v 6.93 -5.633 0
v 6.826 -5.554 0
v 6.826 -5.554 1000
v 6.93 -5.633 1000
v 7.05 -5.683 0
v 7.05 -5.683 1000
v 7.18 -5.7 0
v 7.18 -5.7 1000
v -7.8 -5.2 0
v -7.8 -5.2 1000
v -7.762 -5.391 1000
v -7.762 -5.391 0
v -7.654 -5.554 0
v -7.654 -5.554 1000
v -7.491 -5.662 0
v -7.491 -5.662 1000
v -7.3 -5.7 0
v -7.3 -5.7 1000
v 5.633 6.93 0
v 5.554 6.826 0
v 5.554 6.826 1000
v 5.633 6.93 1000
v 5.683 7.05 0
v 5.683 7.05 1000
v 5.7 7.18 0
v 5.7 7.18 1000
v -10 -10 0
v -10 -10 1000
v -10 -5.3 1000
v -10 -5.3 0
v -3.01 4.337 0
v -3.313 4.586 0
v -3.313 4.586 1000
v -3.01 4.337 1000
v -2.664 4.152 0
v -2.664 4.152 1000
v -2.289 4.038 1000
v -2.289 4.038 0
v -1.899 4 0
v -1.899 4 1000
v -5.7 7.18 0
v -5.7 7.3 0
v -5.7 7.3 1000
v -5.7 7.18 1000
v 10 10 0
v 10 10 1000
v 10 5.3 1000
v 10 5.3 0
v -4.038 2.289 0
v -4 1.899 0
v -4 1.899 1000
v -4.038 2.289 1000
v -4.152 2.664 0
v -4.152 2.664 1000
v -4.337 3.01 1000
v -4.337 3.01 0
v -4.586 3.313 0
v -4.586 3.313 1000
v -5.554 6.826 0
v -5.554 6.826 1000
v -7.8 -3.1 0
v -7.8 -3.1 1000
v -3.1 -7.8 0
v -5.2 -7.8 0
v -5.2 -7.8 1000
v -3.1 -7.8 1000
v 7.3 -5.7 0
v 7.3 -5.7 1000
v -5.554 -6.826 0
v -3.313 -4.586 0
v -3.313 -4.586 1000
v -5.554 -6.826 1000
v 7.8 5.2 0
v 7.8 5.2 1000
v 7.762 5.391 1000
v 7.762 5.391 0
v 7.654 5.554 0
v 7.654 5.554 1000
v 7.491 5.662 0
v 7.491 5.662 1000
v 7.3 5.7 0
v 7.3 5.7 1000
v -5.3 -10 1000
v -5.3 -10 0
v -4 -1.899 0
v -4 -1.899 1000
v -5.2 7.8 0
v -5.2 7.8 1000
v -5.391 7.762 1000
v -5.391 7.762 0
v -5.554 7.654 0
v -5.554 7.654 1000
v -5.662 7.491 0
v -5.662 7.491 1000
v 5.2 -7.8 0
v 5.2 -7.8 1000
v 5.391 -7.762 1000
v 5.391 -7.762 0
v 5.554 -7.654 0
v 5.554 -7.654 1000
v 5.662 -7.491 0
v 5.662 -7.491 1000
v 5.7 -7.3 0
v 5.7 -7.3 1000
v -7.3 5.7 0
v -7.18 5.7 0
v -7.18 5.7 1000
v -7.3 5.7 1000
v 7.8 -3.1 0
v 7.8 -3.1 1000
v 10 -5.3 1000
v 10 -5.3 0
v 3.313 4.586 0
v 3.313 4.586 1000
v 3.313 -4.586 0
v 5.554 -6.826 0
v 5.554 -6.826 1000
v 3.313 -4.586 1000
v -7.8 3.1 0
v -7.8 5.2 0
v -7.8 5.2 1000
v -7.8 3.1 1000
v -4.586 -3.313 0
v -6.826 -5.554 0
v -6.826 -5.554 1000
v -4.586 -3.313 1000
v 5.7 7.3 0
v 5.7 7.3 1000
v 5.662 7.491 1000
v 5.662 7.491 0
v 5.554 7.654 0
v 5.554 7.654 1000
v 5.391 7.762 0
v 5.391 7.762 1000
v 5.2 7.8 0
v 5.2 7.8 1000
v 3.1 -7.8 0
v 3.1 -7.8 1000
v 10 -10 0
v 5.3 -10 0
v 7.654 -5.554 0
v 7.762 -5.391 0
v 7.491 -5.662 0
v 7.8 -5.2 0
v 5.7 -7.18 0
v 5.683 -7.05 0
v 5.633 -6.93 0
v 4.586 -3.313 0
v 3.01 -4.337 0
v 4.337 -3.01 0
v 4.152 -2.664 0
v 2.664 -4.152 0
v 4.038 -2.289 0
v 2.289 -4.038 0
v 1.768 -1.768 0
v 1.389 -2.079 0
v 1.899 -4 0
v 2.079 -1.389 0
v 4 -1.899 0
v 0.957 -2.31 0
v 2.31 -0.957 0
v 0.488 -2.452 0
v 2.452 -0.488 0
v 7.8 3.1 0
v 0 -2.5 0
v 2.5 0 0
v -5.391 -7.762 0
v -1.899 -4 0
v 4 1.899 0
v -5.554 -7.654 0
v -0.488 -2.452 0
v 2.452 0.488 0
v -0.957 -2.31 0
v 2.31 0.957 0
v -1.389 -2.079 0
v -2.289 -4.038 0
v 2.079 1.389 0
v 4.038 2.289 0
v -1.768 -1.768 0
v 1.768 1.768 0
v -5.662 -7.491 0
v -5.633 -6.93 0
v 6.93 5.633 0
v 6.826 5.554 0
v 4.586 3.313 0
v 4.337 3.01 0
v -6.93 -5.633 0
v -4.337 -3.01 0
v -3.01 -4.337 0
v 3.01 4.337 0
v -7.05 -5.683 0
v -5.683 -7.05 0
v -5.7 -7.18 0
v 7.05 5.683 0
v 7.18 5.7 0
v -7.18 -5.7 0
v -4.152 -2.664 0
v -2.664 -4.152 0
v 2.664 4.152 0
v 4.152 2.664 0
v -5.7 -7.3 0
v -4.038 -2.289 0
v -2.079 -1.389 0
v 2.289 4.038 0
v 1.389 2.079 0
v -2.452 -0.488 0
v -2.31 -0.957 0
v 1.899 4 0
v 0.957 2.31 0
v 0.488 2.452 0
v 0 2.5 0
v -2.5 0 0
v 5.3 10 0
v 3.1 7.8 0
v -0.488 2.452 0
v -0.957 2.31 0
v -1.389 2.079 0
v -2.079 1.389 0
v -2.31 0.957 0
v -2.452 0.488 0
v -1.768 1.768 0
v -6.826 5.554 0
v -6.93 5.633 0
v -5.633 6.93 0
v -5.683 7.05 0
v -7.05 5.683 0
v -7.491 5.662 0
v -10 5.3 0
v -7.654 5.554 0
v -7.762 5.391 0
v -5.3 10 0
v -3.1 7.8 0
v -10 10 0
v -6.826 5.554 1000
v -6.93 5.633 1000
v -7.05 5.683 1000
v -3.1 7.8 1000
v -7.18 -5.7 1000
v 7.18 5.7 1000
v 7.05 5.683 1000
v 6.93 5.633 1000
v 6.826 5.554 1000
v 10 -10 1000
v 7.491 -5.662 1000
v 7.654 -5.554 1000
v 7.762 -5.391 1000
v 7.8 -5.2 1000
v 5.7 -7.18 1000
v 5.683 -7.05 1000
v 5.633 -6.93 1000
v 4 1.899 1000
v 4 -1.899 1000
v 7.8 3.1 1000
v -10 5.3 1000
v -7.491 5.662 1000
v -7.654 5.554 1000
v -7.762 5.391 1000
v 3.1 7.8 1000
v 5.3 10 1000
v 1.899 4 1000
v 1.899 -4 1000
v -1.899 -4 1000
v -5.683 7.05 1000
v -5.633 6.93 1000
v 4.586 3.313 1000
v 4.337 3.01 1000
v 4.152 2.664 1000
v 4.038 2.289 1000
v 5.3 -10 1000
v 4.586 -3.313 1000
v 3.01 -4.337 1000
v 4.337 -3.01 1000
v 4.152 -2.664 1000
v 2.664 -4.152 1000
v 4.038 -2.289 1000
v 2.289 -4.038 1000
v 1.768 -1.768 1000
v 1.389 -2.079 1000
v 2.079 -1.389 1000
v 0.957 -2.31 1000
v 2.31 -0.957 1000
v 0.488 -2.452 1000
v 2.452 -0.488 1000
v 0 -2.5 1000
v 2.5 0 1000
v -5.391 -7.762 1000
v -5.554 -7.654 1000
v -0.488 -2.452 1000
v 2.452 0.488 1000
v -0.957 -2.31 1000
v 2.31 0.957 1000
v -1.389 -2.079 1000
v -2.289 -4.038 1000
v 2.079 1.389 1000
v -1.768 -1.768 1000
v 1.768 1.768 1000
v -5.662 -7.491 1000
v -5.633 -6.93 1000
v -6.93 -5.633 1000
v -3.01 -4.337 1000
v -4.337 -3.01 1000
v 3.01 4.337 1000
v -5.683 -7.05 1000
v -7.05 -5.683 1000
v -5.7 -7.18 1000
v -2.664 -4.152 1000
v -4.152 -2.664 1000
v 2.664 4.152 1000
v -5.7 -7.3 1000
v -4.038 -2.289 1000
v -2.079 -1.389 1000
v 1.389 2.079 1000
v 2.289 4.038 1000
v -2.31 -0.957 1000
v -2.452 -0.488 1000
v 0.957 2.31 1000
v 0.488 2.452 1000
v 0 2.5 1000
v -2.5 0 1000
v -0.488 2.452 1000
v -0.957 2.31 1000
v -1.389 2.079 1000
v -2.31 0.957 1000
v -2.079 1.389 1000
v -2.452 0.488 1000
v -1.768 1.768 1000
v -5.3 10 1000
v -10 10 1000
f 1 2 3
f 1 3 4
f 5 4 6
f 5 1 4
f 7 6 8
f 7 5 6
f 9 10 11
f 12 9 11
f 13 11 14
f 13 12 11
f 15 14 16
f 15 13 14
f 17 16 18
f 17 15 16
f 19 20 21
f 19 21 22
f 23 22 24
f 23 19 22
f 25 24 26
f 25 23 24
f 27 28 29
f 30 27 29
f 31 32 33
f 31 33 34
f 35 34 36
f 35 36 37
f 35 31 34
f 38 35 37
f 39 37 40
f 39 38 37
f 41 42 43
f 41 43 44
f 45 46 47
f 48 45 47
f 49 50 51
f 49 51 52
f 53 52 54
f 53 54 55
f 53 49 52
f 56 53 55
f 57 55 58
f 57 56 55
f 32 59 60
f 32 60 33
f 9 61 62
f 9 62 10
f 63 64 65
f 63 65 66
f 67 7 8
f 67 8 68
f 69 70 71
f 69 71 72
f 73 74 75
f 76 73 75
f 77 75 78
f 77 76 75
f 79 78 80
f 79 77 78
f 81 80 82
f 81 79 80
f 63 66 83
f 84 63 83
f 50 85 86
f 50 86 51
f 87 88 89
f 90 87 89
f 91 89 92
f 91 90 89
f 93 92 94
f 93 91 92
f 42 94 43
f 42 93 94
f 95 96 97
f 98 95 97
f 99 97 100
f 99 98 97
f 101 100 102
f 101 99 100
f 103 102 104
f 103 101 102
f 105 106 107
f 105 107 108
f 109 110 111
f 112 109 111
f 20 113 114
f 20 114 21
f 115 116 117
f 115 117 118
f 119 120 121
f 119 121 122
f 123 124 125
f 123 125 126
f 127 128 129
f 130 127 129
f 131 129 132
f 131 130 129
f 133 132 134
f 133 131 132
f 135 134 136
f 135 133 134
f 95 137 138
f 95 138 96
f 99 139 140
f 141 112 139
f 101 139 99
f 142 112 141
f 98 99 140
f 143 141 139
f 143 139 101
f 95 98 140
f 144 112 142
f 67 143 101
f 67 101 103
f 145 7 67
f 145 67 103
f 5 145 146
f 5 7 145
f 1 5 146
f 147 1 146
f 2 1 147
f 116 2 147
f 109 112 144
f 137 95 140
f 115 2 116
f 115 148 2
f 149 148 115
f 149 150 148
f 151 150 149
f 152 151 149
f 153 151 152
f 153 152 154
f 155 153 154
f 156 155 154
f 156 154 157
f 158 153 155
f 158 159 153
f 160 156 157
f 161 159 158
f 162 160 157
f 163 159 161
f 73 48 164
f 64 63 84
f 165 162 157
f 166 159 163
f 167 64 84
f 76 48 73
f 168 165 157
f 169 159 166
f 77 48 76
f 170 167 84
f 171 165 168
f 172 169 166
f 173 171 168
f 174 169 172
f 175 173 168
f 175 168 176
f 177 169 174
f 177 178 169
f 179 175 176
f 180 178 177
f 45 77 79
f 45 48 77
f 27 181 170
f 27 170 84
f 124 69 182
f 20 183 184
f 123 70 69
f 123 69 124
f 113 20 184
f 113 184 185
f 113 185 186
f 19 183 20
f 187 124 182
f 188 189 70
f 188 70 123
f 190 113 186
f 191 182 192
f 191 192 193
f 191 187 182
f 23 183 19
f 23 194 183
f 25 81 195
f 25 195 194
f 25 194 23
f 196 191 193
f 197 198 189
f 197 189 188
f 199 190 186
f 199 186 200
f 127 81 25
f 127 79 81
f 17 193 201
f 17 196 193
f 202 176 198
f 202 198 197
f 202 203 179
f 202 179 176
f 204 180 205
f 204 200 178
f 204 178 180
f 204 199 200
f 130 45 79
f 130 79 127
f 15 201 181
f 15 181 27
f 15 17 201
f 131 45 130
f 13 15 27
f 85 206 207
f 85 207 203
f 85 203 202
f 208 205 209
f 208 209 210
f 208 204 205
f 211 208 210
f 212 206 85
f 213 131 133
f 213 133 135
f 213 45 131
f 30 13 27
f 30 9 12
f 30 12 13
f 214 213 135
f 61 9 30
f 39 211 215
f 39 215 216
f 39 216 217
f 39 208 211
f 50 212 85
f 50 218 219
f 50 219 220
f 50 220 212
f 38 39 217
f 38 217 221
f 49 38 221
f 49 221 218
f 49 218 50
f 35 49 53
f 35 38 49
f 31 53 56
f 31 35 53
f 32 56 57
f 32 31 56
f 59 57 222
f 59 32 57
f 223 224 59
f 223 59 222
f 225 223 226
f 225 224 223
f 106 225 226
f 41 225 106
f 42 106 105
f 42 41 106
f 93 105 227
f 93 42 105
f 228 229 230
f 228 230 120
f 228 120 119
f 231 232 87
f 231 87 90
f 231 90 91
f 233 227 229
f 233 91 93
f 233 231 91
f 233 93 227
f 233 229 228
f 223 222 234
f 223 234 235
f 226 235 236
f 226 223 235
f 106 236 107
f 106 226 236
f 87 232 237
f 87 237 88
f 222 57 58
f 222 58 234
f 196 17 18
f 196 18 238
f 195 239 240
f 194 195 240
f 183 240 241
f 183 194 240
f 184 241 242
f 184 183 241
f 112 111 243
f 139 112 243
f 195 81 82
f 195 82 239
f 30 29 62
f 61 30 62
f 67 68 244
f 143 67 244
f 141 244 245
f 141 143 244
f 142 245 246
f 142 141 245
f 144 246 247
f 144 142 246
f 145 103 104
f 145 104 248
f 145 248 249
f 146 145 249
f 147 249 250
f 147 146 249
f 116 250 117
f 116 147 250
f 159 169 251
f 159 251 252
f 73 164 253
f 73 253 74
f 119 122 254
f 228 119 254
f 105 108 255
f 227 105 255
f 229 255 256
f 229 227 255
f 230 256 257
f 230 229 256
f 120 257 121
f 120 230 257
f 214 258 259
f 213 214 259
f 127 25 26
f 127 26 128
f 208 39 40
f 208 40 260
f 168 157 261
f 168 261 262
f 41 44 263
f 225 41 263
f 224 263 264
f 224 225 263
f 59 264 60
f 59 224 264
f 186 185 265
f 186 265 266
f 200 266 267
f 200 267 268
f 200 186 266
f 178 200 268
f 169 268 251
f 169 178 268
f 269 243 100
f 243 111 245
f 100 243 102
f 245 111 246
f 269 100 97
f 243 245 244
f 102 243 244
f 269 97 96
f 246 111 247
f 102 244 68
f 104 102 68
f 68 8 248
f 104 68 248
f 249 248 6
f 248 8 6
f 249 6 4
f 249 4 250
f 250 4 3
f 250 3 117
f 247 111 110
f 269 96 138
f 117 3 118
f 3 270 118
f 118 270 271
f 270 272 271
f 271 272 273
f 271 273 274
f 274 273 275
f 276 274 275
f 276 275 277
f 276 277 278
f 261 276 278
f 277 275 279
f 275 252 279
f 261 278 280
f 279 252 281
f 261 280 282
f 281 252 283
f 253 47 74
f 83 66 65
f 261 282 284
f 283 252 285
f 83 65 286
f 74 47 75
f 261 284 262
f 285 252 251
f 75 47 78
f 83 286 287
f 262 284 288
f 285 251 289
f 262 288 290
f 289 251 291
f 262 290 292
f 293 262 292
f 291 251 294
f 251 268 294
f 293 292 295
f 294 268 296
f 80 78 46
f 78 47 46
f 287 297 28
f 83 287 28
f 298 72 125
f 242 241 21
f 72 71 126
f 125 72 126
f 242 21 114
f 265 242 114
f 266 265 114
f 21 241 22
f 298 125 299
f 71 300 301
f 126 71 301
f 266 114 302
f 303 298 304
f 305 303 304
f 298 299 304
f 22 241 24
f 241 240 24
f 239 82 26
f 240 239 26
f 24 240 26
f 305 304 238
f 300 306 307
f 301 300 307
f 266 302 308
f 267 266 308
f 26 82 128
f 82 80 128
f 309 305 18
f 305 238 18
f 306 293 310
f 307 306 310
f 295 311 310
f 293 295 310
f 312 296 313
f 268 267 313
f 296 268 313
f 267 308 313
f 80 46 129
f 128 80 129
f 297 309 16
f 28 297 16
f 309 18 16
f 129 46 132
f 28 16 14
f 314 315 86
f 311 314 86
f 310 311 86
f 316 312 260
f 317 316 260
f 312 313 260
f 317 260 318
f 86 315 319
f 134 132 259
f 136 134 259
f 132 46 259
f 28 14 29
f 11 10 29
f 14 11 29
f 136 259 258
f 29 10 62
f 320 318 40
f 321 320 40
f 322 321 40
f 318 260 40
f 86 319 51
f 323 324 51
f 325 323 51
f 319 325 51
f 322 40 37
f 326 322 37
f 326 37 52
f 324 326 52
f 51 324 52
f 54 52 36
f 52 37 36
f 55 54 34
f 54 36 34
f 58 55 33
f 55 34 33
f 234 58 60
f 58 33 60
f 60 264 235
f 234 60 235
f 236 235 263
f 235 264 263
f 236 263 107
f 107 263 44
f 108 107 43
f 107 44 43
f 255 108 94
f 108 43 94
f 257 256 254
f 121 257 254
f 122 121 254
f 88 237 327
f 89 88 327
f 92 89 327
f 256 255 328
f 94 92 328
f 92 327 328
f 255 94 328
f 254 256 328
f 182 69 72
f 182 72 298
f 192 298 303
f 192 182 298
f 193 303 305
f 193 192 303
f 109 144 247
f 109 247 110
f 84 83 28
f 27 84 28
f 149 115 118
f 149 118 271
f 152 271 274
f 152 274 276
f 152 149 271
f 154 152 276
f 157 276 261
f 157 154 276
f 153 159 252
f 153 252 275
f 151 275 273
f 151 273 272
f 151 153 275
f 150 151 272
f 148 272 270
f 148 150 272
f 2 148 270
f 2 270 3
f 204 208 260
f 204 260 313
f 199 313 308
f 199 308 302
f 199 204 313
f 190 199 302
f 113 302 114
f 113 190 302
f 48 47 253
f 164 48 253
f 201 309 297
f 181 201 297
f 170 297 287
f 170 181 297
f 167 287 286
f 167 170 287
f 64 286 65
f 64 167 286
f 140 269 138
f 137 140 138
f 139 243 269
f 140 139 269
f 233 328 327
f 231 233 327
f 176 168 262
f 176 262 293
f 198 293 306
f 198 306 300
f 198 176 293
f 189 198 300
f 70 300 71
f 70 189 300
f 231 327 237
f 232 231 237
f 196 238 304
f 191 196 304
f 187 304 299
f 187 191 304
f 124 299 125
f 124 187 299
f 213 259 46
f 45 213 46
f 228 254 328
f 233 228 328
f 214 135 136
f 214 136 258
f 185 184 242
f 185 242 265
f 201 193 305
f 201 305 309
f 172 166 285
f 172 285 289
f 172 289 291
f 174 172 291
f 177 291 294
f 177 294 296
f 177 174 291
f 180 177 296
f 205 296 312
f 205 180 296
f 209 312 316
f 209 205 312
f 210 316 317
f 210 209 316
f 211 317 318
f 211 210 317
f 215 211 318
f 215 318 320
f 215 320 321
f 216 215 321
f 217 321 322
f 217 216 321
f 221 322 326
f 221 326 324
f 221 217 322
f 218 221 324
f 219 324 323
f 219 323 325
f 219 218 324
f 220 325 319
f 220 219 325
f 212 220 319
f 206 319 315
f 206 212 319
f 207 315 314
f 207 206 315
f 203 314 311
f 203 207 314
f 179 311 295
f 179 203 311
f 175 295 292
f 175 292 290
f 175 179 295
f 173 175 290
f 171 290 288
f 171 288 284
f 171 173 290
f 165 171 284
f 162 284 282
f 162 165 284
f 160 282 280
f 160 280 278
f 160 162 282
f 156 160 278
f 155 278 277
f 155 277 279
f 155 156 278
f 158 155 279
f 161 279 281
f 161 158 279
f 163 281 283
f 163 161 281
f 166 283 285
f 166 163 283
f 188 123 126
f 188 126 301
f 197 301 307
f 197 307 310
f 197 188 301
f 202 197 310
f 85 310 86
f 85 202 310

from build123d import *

# Parameters (mm, degrees)
SKETCH1_R           = 2.5
BOSS_EXTRUDE2_DEPTH = 1000


with BuildPart() as part:
    # Sketch1 → Boss-Extrude2 (new body)
    with BuildSketch(Plane.XY):
        with BuildLine():
            Line((-4, 0), (-4, 1.898780669))
            ThreePointArc((-4, 1.898780669), (-4.152240935, 2.664147534), (-4.585786438, 3.312994231))
            Line((-4.585786438, 3.312994231), (-6.826345597, 5.553553391))
            ThreePointArc((-6.826345597, 5.553553391), (-6.988557271, 5.661939766), (-7.179898987, 5.7))
            Line((-7.179898987, 5.7), (-7.3, 5.7))
            ThreePointArc((-7.3, 5.7), (-7.653553391, 5.553553391), (-7.8, 5.2))
            Line((-7.8, 5.2), (-7.8, 3.1))
            Line((-7.8, 3.1), (-10, 5.3))
            Line((-10, 5.3), (-10, 10))
            Line((-10, 10), (-5.3, 10))
            Line((-5.3, 10), (-3.1, 7.8))
            Line((-3.1, 7.8), (-5.2, 7.8))
            ThreePointArc((-5.2, 7.8), (-5.553553391, 7.653553391), (-5.7, 7.3))
            Line((-5.7, 7.3), (-5.7, 7.179898987))
            ThreePointArc((-5.7, 7.179898987), (-5.661939766, 6.988557271), (-5.553553391, 6.826345597))
            Line((-5.553553391, 6.826345597), (-3.312994231, 4.585786438))
            ThreePointArc((-3.312994231, 4.585786438), (-2.664147534, 4.152240935), (-1.898780669, 4))
            Line((-1.898780669, 4), (0, 4))
            Line((0, 4), (1.898780669, 4))
            ThreePointArc((1.898780669, 4), (2.664147534, 4.152240935), (3.312994231, 4.585786438))
            Line((3.312994231, 4.585786438), (5.553553391, 6.826345597))
            ThreePointArc((5.553553391, 6.826345597), (5.661939766, 6.988557271), (5.7, 7.179898987))
            Line((5.7, 7.179898987), (5.7, 7.3))
            ThreePointArc((5.7, 7.3), (5.553553391, 7.653553391), (5.2, 7.8))
            Line((5.2, 7.8), (3.1, 7.8))
            Line((3.1, 7.8), (5.3, 10))
            Line((5.3, 10), (10, 10))
            Line((10, 10), (10, 5.3))
            Line((10, 5.3), (7.8, 3.1))
            Line((7.8, 3.1), (7.8, 5.2))
            ThreePointArc((7.8, 5.2), (7.653553391, 5.553553391), (7.3, 5.7))
            Line((7.3, 5.7), (7.179898987, 5.7))
            ThreePointArc((7.179898987, 5.7), (6.988557271, 5.661939766), (6.826345597, 5.553553391))
            Line((6.826345597, 5.553553391), (4.585786438, 3.312994231))
            ThreePointArc((4.585786438, 3.312994231), (4.152240935, 2.664147534), (4, 1.898780669))
            Line((4, 1.898780669), (4, 0))
            Line((4, 0), (4, -1.898780669))
            ThreePointArc((4, -1.898780669), (4.152240935, -2.664147534), (4.585786438, -3.312994231))
            Line((4.585786438, -3.312994231), (6.826345597, -5.553553391))
            ThreePointArc((6.826345597, -5.553553391), (6.988557271, -5.661939766), (7.179898987, -5.7))
            Line((7.179898987, -5.7), (7.3, -5.7))
            ThreePointArc((7.3, -5.7), (7.653553391, -5.553553391), (7.8, -5.2))
            Line((7.8, -5.2), (7.8, -3.1))
            Line((7.8, -3.1), (10, -5.3))
            Line((10, -5.3), (10, -10))
            Line((10, -10), (5.3, -10))
            Line((5.3, -10), (3.1, -7.8))
            Line((3.1, -7.8), (5.2, -7.8))
            ThreePointArc((5.2, -7.8), (5.553553391, -7.653553391), (5.7, -7.3))
            Line((5.7, -7.3), (5.7, -7.179898987))
            ThreePointArc((5.7, -7.179898987), (5.661939766, -6.988557271), (5.553553391, -6.826345597))
            Line((5.553553391, -6.826345597), (3.312994231, -4.585786438))
            ThreePointArc((3.312994231, -4.585786438), (2.664147534, -4.152240935), (1.898780669, -4))
            Line((1.898780669, -4), (0, -4))
            Line((0, -4), (-1.898780669, -4))
            ThreePointArc((-1.898780669, -4), (-2.664147534, -4.152240935), (-3.312994231, -4.585786438))
            Line((-3.312994231, -4.585786438), (-5.553553391, -6.826345597))
            ThreePointArc((-5.553553391, -6.826345597), (-5.661939766, -6.988557271), (-5.7, -7.179898987))
            Line((-5.7, -7.179898987), (-5.7, -7.3))
            ThreePointArc((-5.7, -7.3), (-5.553553391, -7.653553391), (-5.2, -7.8))
            Line((-5.2, -7.8), (-3.1, -7.8))
            Line((-3.1, -7.8), (-5.3, -10))
            Line((-5.3, -10), (-10, -10))
            Line((-10, -10), (-10, -5.3))
            Line((-10, -5.3), (-7.8, -3.1))
            Line((-7.8, -3.1), (-7.8, -5.2))
            ThreePointArc((-7.8, -5.2), (-7.653553391, -5.553553391), (-7.3, -5.7))
            Line((-7.3, -5.7), (-7.179898987, -5.7))
            ThreePointArc((-7.179898987, -5.7), (-6.988557271, -5.661939766), (-6.826345597, -5.553553391))
            Line((-6.826345597, -5.553553391), (-4.585786438, -3.312994231))
            ThreePointArc((-4.585786438, -3.312994231), (-4.152240935, -2.664147534), (-4, -1.898780669))
            Line((-4, -1.898780669), (-4, 0))
        make_face()
        Circle(SKETCH1_R, mode=Mode.SUBTRACT)
    extrude(amount=BOSS_EXTRUDE2_DEPTH)


solid = part.part
